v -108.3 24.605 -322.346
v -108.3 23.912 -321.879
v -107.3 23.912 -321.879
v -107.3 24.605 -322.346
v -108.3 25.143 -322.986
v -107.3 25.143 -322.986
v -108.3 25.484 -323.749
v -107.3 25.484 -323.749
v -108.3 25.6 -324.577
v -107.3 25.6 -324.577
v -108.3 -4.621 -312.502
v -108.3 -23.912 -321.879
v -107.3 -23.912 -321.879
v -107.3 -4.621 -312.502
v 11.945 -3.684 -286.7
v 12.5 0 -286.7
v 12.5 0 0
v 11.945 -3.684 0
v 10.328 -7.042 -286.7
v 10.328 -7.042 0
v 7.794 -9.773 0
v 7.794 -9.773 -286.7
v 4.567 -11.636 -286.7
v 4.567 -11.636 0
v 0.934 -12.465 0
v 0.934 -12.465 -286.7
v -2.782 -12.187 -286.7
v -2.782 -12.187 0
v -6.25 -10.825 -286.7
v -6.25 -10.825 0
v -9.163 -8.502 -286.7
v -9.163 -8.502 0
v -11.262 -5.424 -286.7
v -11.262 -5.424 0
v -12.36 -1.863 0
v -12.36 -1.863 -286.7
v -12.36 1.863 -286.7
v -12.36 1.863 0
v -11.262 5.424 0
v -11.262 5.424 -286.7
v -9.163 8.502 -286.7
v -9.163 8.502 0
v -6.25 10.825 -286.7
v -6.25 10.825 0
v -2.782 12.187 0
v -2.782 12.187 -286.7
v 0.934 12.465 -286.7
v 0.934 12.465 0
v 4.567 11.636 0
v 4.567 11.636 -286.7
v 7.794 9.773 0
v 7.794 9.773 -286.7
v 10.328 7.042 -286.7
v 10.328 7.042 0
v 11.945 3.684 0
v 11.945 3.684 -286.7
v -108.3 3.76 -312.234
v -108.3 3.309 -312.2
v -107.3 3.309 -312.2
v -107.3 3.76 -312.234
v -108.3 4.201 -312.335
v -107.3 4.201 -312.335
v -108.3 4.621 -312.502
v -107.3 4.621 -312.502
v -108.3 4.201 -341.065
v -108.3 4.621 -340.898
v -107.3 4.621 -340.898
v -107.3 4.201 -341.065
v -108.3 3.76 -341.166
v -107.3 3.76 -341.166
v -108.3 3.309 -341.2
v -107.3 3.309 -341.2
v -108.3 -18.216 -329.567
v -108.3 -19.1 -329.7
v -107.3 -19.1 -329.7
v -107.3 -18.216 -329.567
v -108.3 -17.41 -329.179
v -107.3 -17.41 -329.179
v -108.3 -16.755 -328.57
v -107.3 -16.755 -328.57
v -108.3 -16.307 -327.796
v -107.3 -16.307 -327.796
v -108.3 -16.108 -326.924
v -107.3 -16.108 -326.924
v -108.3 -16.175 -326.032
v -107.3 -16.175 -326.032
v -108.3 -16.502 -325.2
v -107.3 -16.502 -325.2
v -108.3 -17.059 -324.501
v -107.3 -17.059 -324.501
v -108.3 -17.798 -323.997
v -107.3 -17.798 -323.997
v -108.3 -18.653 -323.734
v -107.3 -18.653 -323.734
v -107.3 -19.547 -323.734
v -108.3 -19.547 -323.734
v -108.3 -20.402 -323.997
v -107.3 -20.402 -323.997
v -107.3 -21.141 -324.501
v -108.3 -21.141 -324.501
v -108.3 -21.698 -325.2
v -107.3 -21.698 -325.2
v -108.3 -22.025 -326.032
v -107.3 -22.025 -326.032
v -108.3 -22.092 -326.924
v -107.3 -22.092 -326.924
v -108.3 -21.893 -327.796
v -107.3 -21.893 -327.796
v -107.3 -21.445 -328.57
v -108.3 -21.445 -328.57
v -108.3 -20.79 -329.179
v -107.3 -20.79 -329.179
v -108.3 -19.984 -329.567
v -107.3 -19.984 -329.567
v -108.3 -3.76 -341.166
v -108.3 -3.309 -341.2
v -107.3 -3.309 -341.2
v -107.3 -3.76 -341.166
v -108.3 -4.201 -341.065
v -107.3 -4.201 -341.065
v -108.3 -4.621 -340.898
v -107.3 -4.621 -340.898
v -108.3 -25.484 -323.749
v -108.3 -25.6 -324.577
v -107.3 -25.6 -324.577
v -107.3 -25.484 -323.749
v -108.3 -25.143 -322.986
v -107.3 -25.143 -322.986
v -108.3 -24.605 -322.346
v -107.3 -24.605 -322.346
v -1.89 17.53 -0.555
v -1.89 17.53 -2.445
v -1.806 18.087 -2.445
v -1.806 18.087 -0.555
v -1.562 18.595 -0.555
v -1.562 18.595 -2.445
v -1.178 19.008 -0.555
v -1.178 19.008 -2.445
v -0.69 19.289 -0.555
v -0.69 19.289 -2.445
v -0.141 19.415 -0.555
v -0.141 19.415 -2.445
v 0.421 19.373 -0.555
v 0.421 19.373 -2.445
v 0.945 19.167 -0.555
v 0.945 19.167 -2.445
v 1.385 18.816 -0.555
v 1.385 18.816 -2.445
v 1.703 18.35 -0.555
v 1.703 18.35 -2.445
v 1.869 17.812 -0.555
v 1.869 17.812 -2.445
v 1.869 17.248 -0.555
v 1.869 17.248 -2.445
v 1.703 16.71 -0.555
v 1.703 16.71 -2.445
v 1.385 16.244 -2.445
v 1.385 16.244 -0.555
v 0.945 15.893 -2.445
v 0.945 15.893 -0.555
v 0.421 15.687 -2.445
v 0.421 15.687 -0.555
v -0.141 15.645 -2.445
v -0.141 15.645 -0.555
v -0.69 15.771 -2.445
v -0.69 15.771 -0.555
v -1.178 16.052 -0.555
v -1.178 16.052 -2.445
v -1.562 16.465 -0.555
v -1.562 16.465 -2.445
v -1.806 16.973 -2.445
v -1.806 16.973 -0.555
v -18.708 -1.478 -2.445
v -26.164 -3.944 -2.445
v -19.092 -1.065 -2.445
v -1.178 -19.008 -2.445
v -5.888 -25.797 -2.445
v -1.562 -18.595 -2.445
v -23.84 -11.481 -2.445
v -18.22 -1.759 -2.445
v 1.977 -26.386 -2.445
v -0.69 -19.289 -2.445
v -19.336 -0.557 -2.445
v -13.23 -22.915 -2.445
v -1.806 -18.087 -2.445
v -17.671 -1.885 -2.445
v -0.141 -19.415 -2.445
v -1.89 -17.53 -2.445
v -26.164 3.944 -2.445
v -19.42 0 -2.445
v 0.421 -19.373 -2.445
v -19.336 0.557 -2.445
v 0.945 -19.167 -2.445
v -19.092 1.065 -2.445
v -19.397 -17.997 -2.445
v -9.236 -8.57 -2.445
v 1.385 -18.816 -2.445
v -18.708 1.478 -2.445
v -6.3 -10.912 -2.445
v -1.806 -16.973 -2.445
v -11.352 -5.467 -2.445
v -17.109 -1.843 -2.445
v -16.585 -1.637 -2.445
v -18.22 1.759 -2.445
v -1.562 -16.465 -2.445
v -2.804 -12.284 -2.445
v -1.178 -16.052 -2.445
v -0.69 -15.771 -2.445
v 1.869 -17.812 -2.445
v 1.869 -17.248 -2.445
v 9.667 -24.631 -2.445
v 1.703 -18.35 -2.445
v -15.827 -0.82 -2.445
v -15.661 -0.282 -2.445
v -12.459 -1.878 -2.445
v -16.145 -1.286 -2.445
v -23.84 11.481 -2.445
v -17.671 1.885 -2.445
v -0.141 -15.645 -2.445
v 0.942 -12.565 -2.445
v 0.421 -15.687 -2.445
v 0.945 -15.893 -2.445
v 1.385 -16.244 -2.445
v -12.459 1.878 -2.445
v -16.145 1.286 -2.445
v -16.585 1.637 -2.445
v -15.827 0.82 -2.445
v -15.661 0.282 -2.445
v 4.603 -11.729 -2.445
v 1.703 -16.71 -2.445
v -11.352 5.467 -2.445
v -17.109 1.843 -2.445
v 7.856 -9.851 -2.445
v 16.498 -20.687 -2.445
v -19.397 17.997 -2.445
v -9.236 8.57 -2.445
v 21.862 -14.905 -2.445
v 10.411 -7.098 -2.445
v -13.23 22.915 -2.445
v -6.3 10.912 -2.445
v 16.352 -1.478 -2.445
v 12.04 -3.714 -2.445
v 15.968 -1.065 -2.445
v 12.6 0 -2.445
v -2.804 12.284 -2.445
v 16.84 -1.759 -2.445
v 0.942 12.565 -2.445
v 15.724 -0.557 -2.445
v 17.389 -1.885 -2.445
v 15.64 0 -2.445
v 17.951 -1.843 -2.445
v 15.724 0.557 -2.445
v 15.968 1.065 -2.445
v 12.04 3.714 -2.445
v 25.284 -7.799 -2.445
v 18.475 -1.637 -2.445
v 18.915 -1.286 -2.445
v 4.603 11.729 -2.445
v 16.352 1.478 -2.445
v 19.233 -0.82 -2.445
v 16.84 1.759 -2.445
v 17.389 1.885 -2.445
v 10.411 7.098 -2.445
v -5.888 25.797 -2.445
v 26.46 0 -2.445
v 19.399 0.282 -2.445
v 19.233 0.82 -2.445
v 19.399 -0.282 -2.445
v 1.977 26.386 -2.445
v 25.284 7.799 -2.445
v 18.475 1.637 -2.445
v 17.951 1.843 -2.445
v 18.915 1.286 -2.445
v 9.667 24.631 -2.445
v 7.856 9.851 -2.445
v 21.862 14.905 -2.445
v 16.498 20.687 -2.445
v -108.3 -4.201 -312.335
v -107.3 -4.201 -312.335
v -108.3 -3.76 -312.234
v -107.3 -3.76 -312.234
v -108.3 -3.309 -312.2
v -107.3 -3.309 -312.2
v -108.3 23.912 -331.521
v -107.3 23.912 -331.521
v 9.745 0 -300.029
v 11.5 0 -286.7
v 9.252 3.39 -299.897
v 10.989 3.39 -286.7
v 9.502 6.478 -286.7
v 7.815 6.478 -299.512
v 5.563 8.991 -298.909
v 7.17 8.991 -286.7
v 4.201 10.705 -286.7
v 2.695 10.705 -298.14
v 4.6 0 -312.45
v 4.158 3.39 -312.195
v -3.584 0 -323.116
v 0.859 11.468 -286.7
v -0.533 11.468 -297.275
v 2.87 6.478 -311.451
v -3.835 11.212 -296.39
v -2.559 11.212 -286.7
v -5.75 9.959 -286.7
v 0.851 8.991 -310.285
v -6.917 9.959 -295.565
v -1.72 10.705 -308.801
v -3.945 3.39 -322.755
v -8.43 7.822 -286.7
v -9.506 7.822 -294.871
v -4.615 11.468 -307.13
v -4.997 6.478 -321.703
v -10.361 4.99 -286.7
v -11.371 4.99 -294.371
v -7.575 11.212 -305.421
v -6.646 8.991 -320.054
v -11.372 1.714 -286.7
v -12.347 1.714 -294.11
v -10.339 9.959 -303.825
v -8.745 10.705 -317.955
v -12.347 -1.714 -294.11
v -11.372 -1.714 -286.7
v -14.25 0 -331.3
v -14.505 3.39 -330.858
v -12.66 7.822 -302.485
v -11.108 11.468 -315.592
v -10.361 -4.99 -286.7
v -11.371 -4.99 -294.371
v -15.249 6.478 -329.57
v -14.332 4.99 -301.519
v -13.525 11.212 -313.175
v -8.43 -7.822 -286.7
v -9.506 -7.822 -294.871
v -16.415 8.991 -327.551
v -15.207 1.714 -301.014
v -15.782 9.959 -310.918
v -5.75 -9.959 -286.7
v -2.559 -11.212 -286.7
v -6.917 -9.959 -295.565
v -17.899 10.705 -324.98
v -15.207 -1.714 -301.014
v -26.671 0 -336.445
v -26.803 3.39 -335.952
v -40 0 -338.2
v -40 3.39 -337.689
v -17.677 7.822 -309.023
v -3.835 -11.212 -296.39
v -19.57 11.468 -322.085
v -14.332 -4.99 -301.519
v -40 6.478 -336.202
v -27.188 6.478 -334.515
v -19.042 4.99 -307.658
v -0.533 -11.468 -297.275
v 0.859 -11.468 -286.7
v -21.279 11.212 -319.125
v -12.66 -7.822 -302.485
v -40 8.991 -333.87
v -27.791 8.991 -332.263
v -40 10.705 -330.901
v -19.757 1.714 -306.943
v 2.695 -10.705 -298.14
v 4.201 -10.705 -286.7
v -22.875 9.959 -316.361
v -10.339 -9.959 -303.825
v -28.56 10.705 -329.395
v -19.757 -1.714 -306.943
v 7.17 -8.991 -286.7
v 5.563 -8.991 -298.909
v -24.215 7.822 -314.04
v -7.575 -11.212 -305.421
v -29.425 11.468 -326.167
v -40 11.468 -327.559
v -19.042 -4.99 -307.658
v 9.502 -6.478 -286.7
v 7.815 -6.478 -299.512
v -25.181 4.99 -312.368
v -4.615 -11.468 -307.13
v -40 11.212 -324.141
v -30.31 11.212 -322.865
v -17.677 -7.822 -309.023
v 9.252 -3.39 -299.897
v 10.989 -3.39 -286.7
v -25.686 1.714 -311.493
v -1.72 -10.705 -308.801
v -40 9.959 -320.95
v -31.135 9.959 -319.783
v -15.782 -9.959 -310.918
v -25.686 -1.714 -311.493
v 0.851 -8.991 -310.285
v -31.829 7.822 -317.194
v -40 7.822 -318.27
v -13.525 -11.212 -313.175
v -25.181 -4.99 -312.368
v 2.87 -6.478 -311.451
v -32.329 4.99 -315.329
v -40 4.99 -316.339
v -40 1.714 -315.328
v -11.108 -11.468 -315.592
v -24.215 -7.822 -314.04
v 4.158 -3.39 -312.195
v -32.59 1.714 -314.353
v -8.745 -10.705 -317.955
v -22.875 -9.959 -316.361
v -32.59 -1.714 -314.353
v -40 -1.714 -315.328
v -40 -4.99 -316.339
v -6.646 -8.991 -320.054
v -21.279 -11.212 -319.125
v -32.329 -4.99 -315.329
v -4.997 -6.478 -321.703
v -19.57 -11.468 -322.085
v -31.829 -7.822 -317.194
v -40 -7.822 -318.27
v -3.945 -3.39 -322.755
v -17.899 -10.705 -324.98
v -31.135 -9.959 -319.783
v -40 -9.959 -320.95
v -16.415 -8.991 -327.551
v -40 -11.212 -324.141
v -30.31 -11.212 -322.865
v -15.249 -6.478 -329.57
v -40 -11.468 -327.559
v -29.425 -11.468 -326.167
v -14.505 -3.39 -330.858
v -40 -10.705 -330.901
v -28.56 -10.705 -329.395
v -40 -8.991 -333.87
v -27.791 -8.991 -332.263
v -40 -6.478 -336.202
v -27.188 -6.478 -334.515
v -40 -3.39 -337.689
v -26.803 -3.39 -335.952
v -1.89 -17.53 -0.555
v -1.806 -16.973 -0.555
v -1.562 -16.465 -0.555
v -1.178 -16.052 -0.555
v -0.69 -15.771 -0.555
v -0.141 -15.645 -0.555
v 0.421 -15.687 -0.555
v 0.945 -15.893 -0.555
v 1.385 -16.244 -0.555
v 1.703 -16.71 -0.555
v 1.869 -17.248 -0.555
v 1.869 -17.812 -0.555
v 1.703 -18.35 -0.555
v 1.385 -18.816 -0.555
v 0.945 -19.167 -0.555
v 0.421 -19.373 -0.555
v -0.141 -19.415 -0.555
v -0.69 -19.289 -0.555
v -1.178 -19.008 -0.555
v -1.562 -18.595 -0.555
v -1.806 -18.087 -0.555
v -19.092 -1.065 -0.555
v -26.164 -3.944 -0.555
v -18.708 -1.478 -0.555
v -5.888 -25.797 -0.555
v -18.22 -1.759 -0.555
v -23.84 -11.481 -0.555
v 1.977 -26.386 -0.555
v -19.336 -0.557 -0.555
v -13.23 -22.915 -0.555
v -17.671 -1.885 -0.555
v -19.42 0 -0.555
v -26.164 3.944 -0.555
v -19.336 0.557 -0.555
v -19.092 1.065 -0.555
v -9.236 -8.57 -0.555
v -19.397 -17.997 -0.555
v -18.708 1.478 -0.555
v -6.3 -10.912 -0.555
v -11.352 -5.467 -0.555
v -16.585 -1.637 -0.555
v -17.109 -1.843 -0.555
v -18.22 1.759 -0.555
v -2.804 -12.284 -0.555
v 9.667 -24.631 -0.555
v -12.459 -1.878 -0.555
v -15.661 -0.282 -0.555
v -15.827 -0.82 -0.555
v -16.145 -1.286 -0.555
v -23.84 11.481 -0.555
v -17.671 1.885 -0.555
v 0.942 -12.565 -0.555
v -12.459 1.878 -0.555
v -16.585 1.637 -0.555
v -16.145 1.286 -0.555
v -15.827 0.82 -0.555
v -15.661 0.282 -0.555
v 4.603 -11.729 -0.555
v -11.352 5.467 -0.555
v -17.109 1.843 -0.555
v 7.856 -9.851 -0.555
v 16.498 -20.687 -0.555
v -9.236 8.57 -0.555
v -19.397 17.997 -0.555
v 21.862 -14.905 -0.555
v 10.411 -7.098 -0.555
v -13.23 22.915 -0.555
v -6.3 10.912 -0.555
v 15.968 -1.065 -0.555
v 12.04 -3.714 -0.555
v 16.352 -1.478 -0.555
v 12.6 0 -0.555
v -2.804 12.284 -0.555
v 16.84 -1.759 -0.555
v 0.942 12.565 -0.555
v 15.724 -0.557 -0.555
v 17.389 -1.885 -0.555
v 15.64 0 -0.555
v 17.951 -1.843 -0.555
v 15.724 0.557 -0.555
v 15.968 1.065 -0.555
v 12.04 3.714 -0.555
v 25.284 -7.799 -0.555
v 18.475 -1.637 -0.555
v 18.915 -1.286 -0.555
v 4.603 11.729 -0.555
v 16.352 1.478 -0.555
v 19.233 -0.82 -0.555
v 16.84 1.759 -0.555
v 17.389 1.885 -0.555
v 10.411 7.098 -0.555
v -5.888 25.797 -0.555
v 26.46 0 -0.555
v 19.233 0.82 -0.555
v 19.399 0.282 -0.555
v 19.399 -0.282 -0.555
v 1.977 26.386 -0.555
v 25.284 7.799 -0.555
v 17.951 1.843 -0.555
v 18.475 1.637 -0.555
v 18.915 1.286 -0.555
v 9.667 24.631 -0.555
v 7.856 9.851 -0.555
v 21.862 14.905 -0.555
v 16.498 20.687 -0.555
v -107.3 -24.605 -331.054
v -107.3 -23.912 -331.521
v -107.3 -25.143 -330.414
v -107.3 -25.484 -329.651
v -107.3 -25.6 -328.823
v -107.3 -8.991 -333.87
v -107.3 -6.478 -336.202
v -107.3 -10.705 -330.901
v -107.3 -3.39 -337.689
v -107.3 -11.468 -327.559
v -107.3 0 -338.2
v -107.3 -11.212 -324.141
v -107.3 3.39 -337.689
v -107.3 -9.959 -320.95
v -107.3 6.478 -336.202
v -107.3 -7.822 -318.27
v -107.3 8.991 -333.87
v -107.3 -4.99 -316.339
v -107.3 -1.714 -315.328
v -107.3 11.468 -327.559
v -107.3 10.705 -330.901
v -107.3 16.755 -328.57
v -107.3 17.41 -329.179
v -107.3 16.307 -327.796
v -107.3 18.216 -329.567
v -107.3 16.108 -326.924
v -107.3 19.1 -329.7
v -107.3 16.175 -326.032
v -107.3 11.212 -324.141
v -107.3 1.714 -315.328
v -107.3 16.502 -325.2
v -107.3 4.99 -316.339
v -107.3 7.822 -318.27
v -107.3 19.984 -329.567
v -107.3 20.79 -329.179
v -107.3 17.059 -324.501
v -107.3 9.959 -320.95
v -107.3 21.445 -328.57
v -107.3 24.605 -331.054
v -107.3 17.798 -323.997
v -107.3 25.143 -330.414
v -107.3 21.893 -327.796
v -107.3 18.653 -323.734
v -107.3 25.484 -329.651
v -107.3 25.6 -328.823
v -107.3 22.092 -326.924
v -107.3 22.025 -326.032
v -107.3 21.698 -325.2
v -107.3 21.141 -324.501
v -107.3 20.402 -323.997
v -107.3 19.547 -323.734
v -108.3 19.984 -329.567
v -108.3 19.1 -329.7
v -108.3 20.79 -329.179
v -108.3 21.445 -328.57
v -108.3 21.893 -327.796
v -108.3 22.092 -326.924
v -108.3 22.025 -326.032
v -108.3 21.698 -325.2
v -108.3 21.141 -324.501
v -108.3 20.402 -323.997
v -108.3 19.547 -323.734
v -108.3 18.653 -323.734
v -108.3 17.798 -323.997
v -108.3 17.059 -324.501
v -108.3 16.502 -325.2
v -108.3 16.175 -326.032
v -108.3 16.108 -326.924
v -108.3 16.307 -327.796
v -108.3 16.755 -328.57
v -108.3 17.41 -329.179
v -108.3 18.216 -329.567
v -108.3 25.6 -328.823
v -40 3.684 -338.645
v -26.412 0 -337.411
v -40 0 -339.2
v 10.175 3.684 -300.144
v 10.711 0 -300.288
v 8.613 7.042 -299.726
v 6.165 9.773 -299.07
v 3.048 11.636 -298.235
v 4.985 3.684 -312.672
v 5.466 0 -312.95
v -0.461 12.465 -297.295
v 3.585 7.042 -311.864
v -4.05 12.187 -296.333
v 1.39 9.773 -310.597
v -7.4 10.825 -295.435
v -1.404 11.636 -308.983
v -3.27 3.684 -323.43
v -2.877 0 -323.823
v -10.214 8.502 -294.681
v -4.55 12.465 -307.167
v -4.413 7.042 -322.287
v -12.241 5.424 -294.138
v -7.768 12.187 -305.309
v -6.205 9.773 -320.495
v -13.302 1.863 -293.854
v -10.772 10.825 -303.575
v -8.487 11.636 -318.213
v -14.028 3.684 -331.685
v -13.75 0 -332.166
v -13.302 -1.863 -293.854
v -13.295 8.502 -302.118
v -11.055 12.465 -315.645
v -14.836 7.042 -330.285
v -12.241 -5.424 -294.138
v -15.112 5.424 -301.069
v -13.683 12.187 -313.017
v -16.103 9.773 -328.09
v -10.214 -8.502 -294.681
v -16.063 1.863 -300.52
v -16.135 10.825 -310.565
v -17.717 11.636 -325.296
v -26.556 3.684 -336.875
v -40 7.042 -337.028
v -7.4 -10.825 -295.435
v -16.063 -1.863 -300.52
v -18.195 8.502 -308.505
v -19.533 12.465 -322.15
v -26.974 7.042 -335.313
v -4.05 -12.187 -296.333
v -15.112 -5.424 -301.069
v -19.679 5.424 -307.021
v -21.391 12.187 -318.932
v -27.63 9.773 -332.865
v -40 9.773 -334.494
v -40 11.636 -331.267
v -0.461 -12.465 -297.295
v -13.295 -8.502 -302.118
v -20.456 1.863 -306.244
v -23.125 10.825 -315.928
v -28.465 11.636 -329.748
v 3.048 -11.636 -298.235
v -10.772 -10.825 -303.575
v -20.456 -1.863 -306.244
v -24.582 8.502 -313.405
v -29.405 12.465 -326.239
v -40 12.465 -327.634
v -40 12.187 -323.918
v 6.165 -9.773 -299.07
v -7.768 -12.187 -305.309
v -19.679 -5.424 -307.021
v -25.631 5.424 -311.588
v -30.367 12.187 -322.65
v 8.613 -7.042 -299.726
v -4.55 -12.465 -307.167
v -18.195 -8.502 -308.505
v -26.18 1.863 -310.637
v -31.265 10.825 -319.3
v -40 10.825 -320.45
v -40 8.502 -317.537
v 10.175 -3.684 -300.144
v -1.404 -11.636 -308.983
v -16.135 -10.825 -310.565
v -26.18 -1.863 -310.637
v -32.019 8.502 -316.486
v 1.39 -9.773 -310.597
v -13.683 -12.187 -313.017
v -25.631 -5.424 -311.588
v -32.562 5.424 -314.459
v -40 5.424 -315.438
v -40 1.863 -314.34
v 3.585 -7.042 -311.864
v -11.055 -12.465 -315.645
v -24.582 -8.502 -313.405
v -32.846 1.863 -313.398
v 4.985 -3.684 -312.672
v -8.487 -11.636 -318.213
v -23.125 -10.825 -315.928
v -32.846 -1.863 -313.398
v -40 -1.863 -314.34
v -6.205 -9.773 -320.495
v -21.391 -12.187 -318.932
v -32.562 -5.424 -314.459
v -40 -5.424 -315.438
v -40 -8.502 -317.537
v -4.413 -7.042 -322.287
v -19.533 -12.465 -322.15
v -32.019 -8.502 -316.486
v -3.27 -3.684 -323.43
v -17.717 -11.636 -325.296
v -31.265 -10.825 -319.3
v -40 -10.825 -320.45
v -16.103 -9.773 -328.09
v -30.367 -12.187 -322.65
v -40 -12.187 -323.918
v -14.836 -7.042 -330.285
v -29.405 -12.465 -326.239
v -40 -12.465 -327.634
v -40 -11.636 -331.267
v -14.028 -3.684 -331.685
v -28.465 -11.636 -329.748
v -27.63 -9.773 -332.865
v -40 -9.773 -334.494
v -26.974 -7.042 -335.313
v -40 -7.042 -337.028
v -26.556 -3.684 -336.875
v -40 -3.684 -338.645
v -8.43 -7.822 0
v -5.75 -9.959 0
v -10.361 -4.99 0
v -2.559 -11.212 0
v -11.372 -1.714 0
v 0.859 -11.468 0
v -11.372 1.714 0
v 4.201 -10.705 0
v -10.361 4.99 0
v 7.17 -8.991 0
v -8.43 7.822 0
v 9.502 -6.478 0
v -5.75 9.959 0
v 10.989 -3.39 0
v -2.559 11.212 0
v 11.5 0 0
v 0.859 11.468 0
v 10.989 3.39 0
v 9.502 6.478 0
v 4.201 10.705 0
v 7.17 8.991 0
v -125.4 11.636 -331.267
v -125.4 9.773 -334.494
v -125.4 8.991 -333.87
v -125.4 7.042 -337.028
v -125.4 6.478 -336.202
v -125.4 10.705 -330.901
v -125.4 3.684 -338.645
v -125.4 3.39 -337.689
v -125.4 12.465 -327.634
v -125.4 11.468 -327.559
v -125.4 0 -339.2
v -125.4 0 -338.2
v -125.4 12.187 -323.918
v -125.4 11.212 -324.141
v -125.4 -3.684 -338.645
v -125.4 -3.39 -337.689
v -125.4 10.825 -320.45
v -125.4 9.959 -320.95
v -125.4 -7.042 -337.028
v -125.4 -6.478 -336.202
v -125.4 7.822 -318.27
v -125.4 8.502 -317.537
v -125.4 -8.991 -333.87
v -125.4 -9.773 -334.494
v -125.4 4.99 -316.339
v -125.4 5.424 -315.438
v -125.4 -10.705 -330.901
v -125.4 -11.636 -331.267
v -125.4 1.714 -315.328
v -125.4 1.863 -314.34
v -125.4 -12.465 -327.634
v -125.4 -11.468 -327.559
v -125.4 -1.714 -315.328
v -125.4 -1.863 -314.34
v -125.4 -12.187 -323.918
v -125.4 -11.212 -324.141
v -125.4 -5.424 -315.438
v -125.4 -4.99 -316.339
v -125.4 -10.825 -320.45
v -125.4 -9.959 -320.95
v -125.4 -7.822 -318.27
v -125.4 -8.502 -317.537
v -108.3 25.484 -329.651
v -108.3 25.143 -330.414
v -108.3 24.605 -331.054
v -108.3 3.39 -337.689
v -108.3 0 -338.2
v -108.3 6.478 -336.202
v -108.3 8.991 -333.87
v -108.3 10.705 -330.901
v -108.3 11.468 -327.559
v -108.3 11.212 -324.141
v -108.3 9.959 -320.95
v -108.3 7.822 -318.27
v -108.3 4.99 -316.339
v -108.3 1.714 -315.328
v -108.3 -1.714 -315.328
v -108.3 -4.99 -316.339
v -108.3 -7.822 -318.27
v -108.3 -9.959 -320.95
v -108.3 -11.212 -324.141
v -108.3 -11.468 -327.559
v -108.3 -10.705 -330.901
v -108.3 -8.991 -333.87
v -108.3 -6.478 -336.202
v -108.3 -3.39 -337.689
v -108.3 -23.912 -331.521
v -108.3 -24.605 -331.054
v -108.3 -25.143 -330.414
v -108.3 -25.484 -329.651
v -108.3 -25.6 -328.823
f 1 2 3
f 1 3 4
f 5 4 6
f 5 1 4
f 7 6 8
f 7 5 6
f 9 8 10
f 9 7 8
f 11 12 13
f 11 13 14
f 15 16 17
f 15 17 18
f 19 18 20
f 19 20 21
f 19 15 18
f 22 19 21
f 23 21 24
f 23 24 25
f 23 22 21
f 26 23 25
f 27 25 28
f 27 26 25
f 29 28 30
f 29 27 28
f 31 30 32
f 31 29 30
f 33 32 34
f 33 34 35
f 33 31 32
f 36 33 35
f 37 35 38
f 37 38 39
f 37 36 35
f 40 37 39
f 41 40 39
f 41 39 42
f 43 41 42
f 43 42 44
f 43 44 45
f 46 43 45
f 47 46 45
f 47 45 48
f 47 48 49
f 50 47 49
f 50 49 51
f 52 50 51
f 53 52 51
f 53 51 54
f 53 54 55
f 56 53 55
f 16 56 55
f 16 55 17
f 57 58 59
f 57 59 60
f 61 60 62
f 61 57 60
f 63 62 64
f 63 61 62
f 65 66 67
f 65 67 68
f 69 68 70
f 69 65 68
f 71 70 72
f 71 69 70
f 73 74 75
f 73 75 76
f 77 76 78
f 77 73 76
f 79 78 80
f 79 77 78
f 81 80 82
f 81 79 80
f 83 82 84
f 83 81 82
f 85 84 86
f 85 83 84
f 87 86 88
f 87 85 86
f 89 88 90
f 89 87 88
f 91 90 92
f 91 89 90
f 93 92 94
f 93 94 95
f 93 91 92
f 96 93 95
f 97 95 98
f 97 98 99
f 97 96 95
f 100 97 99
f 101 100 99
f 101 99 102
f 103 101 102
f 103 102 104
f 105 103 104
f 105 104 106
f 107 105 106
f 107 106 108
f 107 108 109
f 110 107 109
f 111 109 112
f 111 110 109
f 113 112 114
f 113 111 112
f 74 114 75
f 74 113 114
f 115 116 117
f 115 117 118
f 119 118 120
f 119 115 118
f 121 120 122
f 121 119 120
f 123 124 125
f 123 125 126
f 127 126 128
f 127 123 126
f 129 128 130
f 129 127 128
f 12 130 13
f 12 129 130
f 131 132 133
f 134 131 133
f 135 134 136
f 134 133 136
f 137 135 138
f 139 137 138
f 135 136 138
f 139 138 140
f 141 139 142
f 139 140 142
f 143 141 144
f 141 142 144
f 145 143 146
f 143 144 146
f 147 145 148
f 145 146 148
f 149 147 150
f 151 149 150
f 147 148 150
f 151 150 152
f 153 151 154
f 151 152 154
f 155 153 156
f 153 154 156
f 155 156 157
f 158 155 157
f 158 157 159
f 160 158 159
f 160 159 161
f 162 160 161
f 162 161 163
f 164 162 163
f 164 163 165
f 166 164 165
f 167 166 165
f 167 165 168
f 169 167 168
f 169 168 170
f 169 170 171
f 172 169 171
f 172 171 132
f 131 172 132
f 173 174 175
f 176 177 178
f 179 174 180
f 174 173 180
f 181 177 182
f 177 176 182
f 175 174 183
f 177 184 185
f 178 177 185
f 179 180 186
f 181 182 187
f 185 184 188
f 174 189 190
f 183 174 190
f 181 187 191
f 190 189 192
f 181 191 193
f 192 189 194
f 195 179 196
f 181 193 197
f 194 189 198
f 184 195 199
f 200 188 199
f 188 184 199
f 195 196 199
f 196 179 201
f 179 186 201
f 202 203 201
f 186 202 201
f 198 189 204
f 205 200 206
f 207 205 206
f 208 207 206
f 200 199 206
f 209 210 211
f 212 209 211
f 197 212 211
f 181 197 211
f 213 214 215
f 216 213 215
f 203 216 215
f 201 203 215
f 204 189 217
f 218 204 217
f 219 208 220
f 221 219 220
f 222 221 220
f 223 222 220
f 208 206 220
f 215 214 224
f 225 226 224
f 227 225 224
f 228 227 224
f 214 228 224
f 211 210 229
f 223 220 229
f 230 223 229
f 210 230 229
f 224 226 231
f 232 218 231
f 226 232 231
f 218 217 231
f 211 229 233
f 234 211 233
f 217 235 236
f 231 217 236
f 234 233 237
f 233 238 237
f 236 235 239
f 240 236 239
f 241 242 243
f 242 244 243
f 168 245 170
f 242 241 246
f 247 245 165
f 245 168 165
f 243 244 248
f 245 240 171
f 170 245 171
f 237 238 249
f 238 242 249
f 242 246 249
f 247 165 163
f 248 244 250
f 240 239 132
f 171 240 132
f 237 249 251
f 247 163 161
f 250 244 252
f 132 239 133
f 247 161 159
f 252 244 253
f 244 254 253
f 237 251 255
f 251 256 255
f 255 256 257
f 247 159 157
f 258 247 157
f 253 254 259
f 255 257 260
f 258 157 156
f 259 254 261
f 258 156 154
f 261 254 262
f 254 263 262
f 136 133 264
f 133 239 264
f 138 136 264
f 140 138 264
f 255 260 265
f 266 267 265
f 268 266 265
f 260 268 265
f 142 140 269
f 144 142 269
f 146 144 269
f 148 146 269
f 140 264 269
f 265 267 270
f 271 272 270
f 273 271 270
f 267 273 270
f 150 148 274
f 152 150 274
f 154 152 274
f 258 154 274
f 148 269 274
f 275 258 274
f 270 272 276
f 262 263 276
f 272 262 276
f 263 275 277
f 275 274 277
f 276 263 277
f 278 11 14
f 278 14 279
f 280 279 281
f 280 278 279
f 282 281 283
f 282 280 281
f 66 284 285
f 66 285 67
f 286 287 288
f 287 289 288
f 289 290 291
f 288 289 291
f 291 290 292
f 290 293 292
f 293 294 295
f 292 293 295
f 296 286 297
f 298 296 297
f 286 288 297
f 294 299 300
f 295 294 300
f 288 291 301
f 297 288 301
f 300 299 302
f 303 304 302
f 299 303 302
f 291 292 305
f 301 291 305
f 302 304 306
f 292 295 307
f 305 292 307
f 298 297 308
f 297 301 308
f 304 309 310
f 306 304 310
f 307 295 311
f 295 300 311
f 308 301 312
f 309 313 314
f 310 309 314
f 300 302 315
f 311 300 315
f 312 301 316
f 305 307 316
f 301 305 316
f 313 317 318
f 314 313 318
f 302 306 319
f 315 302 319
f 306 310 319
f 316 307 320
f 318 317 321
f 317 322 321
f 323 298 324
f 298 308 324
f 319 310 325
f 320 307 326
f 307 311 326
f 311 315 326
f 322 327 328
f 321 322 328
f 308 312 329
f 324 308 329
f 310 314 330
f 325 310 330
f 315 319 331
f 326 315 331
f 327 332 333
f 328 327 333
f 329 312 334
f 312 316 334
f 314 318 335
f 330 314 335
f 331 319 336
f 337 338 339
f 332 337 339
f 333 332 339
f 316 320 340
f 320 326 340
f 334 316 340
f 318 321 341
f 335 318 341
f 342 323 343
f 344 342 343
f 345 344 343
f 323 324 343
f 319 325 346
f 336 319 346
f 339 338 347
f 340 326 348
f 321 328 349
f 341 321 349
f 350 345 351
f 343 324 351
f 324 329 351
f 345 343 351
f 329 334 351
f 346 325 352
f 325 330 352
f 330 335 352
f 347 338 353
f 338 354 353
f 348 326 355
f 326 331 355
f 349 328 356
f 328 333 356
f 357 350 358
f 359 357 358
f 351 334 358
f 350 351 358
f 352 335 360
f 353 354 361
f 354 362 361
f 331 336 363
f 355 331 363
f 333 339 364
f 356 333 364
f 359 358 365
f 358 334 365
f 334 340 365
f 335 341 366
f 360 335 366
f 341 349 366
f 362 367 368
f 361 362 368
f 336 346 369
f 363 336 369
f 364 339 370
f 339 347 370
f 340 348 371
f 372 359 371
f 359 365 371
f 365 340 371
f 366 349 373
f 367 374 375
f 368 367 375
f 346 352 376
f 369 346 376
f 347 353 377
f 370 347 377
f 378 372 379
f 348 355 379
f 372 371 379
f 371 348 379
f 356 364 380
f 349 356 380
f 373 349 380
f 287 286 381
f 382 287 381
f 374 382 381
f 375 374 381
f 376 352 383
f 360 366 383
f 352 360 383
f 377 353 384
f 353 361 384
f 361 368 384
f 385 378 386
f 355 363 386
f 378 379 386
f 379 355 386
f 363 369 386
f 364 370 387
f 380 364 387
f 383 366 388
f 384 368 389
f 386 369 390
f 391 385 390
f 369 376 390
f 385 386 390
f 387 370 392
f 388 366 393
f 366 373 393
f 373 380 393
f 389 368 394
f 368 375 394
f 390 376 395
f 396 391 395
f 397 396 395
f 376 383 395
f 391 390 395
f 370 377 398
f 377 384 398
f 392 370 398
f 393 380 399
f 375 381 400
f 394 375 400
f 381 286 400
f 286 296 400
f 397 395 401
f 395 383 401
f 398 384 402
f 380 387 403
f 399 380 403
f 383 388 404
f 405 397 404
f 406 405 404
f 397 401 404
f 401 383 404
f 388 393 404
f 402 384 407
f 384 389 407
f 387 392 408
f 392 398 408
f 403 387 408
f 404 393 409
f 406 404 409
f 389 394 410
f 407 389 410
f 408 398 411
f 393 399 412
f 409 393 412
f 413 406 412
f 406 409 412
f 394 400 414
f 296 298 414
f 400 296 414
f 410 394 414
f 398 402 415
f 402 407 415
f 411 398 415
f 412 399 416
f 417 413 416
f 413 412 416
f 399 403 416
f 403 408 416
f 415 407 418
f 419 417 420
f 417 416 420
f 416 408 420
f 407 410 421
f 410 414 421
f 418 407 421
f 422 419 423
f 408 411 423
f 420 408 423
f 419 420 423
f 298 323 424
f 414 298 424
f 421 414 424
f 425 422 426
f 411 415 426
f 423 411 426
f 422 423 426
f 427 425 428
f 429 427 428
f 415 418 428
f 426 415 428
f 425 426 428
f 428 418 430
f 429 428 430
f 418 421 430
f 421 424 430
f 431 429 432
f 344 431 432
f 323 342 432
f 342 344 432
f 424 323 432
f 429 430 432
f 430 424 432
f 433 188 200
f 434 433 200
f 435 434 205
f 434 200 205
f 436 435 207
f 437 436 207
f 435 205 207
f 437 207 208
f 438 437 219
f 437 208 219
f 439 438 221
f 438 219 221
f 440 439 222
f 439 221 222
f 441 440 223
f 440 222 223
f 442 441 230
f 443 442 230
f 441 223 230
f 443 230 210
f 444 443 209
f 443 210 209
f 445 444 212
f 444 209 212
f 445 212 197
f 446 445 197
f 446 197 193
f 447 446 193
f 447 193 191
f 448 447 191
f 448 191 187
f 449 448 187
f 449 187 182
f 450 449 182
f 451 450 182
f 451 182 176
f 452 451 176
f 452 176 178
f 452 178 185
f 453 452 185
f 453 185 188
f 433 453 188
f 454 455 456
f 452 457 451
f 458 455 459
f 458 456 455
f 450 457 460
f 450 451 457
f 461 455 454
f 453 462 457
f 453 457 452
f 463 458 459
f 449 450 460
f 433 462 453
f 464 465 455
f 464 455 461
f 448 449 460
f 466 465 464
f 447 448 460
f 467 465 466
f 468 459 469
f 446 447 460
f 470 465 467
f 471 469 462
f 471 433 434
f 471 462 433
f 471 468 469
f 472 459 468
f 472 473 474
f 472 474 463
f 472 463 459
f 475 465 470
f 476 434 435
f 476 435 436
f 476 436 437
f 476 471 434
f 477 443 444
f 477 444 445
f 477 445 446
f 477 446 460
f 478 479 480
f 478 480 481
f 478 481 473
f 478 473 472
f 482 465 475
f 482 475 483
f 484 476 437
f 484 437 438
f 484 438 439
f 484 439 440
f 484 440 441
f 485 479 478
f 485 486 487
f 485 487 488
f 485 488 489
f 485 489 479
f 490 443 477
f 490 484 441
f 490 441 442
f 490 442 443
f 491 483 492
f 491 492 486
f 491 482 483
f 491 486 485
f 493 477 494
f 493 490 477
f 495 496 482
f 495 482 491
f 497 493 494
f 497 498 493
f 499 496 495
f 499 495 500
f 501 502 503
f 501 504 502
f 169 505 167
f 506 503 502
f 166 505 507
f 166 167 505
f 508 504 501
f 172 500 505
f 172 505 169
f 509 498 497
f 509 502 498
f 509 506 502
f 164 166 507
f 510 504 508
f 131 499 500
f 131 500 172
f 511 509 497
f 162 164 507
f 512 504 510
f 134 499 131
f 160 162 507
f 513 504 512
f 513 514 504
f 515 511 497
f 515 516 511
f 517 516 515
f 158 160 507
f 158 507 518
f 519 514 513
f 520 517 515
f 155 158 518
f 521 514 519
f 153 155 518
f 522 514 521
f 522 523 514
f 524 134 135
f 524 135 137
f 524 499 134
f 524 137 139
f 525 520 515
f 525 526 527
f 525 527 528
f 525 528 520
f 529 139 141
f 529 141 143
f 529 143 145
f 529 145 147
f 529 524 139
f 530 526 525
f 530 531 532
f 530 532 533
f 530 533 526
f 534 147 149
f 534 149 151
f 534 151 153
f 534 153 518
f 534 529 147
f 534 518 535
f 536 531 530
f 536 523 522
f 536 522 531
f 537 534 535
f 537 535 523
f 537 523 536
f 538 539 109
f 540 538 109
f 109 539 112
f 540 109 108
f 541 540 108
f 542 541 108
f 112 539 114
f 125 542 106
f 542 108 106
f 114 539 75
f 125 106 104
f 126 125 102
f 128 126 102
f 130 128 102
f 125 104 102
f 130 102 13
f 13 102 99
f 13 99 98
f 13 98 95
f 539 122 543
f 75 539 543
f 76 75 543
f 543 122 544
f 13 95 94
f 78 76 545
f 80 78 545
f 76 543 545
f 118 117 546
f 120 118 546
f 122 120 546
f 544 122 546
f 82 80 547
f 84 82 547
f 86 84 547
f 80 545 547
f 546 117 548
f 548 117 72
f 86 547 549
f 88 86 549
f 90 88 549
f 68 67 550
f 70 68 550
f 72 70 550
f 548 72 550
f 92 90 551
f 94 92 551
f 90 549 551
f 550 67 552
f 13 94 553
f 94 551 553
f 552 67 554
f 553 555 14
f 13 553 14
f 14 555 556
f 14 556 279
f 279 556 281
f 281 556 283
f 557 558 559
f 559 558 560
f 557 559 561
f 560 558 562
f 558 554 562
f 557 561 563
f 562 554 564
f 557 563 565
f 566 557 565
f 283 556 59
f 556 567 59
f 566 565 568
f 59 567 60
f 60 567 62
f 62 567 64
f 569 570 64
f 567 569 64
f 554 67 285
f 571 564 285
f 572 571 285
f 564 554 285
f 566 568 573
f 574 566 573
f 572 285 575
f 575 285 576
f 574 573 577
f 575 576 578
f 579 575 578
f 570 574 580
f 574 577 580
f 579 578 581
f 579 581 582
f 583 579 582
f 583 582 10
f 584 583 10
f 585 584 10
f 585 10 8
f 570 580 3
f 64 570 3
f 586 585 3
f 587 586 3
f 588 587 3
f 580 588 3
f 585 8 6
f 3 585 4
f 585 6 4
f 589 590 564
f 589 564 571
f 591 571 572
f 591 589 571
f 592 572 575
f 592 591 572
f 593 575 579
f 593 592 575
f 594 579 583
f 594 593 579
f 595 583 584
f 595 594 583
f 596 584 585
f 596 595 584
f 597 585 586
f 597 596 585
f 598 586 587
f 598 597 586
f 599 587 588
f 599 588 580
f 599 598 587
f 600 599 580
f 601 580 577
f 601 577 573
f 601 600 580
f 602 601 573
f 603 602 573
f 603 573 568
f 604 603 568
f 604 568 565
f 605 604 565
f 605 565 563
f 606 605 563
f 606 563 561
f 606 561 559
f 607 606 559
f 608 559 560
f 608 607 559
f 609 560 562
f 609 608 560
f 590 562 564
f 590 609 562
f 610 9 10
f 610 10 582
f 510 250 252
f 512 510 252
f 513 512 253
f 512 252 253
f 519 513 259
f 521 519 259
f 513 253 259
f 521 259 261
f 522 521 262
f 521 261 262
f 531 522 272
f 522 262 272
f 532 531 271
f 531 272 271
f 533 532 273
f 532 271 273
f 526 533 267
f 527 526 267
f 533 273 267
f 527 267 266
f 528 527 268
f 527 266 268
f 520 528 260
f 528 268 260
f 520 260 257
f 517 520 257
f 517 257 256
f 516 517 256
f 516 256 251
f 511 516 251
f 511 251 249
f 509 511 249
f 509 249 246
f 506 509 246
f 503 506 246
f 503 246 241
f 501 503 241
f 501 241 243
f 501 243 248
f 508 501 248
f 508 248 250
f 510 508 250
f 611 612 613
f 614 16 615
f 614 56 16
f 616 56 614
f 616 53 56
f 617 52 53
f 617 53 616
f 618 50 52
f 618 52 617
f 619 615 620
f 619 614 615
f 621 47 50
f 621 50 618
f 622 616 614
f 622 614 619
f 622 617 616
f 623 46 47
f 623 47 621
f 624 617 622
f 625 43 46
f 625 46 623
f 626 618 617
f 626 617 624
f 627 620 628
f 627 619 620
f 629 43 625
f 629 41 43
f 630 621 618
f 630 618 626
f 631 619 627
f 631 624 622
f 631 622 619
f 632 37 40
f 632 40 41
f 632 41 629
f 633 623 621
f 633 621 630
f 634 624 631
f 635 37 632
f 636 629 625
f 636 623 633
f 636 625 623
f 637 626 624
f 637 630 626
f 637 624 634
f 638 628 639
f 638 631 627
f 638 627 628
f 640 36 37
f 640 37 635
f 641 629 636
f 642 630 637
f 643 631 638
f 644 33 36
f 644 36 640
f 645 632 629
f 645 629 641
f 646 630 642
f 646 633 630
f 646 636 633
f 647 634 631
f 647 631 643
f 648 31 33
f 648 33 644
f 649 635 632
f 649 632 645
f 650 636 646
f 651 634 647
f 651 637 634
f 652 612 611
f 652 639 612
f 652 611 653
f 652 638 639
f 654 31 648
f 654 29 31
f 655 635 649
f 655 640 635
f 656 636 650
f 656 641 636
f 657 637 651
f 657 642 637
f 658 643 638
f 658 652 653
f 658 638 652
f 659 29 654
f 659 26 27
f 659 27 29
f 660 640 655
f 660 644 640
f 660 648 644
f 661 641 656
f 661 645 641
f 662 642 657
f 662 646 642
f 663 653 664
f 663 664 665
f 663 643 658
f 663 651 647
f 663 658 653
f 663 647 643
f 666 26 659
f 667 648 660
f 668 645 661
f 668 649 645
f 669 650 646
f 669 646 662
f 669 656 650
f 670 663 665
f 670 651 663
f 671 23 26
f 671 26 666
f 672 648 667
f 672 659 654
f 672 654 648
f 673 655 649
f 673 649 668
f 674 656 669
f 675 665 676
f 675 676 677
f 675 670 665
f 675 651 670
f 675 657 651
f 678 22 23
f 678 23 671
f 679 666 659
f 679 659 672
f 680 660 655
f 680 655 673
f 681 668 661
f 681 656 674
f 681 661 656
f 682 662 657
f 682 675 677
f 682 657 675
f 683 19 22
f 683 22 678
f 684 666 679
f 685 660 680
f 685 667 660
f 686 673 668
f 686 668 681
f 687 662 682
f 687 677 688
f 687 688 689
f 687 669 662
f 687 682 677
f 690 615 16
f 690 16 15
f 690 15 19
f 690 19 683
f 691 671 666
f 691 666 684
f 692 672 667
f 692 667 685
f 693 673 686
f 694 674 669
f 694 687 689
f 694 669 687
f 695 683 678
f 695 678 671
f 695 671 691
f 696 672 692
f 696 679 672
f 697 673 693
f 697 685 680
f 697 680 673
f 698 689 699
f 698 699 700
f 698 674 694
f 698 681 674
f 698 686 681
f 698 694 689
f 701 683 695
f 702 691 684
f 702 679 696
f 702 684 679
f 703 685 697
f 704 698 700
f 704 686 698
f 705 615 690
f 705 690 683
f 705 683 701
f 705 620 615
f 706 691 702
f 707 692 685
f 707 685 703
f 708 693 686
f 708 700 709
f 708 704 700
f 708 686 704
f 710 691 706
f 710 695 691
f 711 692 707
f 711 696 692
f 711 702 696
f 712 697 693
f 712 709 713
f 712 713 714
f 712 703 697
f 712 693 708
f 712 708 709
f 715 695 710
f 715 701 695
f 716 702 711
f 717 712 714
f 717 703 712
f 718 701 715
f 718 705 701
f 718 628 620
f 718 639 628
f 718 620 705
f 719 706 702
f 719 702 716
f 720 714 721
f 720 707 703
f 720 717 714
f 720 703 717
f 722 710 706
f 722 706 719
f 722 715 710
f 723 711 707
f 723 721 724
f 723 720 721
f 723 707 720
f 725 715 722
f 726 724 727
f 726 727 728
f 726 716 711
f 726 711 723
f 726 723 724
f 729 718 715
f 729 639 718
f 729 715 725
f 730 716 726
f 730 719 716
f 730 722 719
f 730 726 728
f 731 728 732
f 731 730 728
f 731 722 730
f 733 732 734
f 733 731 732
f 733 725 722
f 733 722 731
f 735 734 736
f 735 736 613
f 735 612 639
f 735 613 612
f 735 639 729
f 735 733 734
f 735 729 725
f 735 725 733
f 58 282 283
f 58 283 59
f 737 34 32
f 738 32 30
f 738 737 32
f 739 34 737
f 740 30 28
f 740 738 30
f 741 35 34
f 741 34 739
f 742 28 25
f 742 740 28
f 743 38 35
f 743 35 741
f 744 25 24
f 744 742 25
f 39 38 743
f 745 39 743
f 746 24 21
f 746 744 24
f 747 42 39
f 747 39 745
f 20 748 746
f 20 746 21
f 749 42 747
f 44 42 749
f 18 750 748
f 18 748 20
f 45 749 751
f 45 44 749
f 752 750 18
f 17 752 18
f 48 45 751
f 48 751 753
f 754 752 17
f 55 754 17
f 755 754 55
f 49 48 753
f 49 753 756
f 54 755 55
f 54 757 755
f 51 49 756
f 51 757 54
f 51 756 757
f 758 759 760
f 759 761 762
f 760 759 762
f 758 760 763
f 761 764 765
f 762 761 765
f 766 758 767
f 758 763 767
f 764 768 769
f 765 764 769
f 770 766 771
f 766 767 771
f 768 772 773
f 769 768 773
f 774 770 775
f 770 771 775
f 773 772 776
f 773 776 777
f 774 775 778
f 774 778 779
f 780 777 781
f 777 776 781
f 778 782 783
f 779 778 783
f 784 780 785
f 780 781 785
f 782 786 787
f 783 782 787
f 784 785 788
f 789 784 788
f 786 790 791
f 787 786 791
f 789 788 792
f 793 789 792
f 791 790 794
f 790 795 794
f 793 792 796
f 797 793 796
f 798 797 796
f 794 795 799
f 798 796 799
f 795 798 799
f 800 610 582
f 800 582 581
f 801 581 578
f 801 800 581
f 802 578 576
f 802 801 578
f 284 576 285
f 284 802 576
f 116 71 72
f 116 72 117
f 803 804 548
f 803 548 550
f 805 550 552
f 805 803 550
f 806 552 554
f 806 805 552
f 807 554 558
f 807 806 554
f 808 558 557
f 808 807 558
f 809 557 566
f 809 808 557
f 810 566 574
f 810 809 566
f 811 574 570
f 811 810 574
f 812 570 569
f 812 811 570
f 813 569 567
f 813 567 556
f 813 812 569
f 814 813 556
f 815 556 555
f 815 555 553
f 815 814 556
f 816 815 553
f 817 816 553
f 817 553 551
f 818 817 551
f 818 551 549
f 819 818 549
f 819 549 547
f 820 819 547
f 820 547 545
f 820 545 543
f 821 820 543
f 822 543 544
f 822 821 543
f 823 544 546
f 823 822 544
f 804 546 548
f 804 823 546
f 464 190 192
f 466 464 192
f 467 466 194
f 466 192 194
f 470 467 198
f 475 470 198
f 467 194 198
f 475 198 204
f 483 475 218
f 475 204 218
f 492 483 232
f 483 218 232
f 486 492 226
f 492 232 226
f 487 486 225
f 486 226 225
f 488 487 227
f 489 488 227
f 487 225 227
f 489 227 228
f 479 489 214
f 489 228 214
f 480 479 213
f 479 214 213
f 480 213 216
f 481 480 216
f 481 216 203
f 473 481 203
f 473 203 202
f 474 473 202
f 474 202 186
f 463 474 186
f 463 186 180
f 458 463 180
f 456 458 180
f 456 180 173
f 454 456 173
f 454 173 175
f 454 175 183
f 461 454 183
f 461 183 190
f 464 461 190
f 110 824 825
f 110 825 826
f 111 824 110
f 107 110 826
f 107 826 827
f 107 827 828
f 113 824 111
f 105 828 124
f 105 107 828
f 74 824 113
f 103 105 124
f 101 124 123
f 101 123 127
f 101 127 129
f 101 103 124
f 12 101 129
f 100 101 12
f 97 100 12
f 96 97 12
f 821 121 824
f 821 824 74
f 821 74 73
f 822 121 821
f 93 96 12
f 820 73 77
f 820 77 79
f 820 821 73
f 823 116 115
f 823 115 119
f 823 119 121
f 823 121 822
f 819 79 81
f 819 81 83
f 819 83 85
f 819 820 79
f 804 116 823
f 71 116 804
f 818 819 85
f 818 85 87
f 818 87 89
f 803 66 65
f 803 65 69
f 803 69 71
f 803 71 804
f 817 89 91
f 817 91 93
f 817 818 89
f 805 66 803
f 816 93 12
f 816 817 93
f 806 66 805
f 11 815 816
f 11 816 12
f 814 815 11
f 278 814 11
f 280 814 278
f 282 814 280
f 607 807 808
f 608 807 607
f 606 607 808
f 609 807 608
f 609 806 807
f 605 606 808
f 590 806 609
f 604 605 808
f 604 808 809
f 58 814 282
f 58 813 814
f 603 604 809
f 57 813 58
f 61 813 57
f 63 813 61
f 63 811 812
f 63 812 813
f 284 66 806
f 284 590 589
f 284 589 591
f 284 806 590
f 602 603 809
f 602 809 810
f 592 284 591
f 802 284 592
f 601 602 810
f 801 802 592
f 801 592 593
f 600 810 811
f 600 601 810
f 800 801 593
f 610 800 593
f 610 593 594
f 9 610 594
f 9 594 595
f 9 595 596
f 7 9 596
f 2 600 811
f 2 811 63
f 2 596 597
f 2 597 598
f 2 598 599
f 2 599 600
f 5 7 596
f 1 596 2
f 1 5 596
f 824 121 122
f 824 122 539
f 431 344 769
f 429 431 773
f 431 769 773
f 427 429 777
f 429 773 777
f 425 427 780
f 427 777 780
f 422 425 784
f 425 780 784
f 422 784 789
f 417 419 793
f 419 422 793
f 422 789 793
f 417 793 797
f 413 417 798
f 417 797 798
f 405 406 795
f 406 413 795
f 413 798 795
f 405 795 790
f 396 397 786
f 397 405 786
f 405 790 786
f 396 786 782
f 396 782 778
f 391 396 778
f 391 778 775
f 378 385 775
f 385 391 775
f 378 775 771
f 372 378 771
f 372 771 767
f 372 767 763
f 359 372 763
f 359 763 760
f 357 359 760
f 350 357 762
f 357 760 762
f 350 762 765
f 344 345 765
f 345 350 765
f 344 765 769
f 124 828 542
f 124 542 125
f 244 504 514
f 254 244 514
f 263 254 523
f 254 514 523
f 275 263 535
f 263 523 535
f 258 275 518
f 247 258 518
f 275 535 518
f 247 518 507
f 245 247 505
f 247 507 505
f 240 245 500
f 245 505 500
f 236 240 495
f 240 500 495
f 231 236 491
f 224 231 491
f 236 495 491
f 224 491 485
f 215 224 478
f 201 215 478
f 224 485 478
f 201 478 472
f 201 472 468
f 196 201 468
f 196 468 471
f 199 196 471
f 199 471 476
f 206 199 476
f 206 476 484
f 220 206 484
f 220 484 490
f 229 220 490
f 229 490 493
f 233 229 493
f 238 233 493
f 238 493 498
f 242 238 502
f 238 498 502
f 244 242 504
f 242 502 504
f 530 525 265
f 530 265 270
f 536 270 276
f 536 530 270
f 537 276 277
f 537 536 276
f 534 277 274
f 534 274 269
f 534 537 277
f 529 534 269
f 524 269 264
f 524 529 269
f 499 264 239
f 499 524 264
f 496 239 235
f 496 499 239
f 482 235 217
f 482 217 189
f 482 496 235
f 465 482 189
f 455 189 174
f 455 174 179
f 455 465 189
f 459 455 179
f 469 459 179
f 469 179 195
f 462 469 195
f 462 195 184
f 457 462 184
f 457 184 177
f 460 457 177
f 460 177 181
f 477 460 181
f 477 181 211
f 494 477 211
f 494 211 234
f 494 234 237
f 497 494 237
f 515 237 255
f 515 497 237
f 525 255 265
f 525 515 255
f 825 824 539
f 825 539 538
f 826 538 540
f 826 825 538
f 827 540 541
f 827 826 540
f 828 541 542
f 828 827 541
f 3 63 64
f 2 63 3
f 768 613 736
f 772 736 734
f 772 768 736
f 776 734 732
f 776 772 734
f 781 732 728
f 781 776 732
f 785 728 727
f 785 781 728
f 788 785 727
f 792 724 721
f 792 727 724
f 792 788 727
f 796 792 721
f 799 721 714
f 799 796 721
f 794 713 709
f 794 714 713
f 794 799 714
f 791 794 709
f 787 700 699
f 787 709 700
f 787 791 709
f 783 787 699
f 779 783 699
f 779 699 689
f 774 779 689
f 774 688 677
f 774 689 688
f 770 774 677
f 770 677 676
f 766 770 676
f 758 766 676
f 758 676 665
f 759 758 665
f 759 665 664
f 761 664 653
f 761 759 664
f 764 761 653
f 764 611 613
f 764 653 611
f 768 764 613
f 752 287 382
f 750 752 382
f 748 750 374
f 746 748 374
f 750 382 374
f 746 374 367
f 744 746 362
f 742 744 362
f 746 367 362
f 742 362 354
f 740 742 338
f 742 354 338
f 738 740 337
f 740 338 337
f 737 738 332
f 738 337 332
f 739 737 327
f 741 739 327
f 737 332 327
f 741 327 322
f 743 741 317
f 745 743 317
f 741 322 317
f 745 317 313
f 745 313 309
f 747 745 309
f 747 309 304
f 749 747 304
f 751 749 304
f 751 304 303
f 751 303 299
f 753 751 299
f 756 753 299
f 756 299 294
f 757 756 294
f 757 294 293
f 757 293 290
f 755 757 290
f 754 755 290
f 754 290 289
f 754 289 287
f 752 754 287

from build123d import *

# Parameters (mm, degrees)
SKETCH1_R           = 42
SKETCH1_R_2         = 20
BOSS_EXTRUDE1_DEPTH = 3
SCALE1_SCALE        = 0.63
SKETCH45_R          = 12.5
SKETCH45_R_2        = 11.5
SKETCH47_R          = 1.89
CUT_EXTRUDE1_DEPTH  = 10
SKETCH50_R          = 3
SKETCH50_R_2        = 11.5
BOSS_EXTRUDE2_DEPTH = 1


with BuildPart() as part:
    # Sketch1 → Boss-Extrude1 (new body)
    with BuildSketch(Plane.XY):
        Circle(SKETCH1_R)
        Circle(SKETCH1_R_2, mode=Mode.SUBTRACT)
    extrude(amount=-BOSS_EXTRUDE1_DEPTH)


with BuildPart() as part_1:
    # Scale1: scaled about (0, 0, -1.5)
    add(part.part.scale(SCALE1_SCALE).moved(Location((0, 0, -0.555))))

    # Sketch47 → Cut-Extrude1 (cut)
    with BuildSketch(Plane(origin=(0, 0, -2.445), x_dir=(-1, 0, 0), z_dir=(0, 0, -1))):
        with Locations((0, 17.53)):
            Circle(SKETCH47_R)
        with Locations((17.53, 0)):
            Circle(SKETCH47_R)
        with Locations((0, -17.53)):
            Circle(SKETCH47_R)
        with Locations((-17.53, 0)):
            Circle(SKETCH47_R)
    extrude(amount=-CUT_EXTRUDE1_DEPTH, mode=Mode.SUBTRACT)


with BuildPart() as body_2:
    # Sweep-Thin1: sweep along a curve in space
    with BuildLine() as sweep_thin1_path:
        Line((0, 0, 0), (0, 0, -286.7))
        ThreePointArc((-40, 0, -326.7), (-11.715728753, 0, -314.984271247), (0, 0, -286.7))
        Line((-40, 0, -326.7), (-125.4, 0, -326.7))
    # Sketch45 → Sweep-Thin1 (sweep)
    with BuildSketch(Plane(origin=(-125.4, 0, 0), x_dir=(0, 0, -1), z_dir=(1, 0, 0))):
        with Locations((326.7, 0)):
            Circle(SKETCH45_R)
        with Locations((326.7, 0)):
            Circle(SKETCH45_R_2, mode=Mode.SUBTRACT)
    sweep(path=sweep_thin1_path.line)


with BuildPart() as body_3:
    # Sketch50 → Boss-Extrude2 (new body)
    with BuildSketch(Plane(origin=(-108.3, 0, 0), x_dir=(0, 0, -1), z_dir=(1, 0, 0))):
        with BuildLine():
            Line((324.577342927, 25.6), (328.822657073, 25.6))
            ThreePointArc((328.822657073, 25.6), (330.41408185, 25.143101882), (331.520760636, 23.911578121))
            Line((331.520760636, 23.911578121), (340.898103562, 4.6210441))
            ThreePointArc((340.898103562, 4.6210441), (341.123551837, 3.982403314), (341.2, 3.30946598))
            Line((341.2, 3.30946598), (341.2, -3.30946598))
            ThreePointArc((341.2, -3.30946598), (341.123551837, -3.982403314), (340.898103562, -4.6210441))
            Line((340.898103562, -4.6210441), (331.520760636, -23.911578121))
            ThreePointArc((331.520760636, -23.911578121), (330.41408185, -25.143101882), (328.822657073, -25.6))
            Line((328.822657073, -25.6), (324.577342927, -25.6))
            ThreePointArc((324.577342927, -25.6), (322.98591815, -25.143101882), (321.879239364, -23.911578121))
            Line((321.879239364, -23.911578121), (312.501896438, -4.6210441))
            ThreePointArc((312.501896438, -4.6210441), (312.276448163, -3.982403314), (312.2, -3.30946598))
            Line((312.2, -3.30946598), (312.2, 3.30946598))
            ThreePointArc((312.2, 3.30946598), (312.276448163, 3.982403314), (312.501896438, 4.6210441))
            Line((312.501896438, 4.6210441), (321.879239364, 23.911578121))
            ThreePointArc((321.879239364, 23.911578121), (322.98591815, 25.143101882), (324.577342927, 25.6))
        make_face()
        with Locations((326.7, 19.1)):
            Circle(SKETCH50_R, mode=Mode.SUBTRACT)
        with Locations((326.7, 0)):
            Circle(SKETCH50_R_2, mode=Mode.SUBTRACT)
        with Locations((326.7, -19.1)):
            Circle(SKETCH50_R, mode=Mode.SUBTRACT)
    extrude(amount=BOSS_EXTRUDE2_DEPTH)


solid = Compound([part_1.part, body_2.part, body_3.part])
